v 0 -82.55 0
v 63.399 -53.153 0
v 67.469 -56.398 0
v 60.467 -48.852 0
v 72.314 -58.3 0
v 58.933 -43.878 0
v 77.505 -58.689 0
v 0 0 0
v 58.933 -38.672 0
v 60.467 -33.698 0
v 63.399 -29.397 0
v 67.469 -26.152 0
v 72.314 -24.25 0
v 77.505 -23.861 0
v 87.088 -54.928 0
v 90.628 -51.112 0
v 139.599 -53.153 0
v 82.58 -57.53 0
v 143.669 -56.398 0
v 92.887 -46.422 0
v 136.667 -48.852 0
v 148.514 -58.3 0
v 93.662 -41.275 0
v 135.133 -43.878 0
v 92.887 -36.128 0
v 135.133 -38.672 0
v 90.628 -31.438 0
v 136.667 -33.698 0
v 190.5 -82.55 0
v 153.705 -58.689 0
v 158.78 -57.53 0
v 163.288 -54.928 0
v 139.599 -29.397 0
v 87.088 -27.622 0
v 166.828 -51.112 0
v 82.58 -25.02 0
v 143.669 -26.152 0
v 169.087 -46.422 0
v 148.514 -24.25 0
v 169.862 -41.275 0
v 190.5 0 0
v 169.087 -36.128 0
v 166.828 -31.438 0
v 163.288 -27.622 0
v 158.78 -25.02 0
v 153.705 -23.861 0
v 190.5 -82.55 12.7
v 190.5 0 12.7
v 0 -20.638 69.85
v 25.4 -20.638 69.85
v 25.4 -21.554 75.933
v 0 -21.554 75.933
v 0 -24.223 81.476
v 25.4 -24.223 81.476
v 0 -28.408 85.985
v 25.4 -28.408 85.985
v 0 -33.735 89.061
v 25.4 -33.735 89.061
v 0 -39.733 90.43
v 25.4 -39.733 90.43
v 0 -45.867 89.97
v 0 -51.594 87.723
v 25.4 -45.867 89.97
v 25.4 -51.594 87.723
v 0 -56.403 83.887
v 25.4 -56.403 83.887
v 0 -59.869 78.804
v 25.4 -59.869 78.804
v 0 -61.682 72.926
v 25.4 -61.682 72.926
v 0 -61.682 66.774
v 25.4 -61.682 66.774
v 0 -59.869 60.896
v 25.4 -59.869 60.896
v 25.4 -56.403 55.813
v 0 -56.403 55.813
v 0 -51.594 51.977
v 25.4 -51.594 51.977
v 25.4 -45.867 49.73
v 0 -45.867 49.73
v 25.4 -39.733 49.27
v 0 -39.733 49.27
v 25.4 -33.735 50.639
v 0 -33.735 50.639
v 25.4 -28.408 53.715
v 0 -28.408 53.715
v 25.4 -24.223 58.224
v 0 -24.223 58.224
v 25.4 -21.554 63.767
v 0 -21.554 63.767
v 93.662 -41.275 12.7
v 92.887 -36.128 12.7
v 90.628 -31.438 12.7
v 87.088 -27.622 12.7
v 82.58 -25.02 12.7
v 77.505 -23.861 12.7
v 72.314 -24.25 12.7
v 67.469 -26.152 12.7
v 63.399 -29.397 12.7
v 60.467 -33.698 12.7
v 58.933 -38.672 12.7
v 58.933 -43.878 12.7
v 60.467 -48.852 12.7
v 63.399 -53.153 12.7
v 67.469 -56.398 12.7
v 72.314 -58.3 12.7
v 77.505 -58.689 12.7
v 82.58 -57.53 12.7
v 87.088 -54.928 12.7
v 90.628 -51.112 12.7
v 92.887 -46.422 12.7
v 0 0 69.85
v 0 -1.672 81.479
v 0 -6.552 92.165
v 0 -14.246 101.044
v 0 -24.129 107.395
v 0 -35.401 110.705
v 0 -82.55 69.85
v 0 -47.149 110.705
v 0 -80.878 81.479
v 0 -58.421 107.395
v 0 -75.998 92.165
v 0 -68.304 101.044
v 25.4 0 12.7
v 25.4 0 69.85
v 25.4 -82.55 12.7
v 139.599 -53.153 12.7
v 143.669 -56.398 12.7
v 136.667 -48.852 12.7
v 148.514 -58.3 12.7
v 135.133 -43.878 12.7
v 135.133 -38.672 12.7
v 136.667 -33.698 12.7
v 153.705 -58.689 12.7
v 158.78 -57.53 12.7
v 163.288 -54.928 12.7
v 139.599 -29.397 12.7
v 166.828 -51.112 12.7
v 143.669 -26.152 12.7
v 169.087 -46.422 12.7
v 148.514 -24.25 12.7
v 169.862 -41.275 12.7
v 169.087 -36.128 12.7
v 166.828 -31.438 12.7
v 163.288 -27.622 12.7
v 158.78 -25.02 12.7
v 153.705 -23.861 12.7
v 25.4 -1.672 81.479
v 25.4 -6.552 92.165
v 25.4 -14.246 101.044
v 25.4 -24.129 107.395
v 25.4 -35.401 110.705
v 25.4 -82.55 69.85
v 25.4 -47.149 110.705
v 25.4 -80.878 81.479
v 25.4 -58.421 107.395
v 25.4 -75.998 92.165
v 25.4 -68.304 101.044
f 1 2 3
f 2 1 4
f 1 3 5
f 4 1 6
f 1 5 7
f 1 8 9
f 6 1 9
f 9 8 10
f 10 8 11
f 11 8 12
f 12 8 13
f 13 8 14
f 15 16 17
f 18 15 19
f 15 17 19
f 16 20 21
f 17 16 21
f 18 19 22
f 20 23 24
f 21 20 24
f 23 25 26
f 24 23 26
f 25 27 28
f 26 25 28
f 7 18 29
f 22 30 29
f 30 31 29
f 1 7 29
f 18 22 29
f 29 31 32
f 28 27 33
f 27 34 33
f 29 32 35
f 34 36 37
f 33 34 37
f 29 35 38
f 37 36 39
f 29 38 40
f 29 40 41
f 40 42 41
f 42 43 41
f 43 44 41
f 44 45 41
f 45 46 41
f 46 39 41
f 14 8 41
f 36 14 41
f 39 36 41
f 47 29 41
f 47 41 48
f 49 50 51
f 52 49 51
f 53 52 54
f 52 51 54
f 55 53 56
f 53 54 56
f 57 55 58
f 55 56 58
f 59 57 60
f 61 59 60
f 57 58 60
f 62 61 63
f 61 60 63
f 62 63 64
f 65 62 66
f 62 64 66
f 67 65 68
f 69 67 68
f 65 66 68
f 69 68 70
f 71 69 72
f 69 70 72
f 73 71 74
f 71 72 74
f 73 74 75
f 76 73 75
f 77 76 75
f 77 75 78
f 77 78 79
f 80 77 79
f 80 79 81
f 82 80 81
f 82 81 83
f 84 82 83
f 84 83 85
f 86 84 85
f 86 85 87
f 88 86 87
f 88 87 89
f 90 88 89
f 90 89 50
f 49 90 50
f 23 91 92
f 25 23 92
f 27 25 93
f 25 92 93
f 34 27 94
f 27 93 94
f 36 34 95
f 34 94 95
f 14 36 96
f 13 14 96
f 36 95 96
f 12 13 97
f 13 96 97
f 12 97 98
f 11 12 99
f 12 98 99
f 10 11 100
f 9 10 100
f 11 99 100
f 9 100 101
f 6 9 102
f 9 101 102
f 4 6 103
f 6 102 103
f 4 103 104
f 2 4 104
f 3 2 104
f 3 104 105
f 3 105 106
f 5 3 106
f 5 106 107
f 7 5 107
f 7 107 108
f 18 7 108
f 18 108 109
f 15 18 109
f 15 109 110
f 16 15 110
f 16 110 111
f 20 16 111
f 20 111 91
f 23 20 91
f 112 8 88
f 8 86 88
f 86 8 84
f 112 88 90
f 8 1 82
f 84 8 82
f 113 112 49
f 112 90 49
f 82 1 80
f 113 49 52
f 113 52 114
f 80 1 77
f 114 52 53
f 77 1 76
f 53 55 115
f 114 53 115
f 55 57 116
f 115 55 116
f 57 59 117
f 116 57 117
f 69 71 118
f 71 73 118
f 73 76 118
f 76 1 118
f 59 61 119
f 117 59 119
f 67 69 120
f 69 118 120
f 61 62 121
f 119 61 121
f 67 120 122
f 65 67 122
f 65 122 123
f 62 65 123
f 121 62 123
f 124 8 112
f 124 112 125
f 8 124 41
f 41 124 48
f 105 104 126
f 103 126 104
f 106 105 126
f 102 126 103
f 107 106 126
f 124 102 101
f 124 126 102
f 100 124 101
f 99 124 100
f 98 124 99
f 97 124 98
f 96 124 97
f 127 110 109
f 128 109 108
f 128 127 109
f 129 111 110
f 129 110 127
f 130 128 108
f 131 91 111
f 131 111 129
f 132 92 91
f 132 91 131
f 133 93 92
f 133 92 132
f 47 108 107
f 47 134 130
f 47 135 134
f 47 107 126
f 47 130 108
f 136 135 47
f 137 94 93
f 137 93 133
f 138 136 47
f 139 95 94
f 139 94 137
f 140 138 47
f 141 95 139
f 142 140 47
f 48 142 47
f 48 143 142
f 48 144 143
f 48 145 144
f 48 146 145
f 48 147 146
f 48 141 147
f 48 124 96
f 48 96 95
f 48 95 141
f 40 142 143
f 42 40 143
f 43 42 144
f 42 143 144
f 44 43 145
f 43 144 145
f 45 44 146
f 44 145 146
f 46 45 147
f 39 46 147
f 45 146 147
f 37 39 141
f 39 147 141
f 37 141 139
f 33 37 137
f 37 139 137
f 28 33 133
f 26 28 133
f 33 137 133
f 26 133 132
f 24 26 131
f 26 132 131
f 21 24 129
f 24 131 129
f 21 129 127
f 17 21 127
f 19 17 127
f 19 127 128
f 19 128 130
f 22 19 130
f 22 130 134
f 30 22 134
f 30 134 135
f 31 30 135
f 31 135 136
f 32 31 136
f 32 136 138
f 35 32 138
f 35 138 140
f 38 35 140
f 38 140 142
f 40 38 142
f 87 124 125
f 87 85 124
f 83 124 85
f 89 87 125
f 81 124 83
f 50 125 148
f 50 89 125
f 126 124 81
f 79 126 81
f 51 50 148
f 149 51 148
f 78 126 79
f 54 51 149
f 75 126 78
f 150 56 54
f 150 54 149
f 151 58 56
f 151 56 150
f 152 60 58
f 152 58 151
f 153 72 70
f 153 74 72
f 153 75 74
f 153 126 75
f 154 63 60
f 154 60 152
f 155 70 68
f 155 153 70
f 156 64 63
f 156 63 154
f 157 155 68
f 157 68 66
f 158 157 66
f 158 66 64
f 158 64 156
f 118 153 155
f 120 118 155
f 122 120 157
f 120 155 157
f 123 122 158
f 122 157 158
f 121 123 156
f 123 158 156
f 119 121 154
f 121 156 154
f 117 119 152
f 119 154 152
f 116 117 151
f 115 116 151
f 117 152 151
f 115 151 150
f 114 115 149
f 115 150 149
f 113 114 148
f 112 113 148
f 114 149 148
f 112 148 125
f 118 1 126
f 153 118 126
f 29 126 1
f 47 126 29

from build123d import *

# Parameters (mm, degrees)
F0_W     = 190.5
F0_H     = 12.7
F1_DEPTH = 82.55
F2_R     = 17.4625
F3_DEPTH = 25.4
F4_W     = 25.4
F4_H     = 101.6
F5_DEPTH = 82.55
F7_DEPTH = 25.4
F8_R     = 20.6375
F9_DEPTH = 25.401


with BuildPart() as f1:
    # F0 (on Front) → F1 (new body)
    with BuildSketch(Plane.XZ):
        with Locations((95.25, 6.35)):
            Rectangle(F0_W, F0_H)
    extrude(amount=F1_DEPTH)

    # F2 (on face) → F3 (cut)
    with BuildSketch(Plane.XY.offset(12.7)):
        with Locations((76.2, -41.275)):
            Circle(F2_R)
        with Locations((152.4, -41.275)):
            Circle(F2_R)
    extrude(amount=-F3_DEPTH, mode=Mode.SUBTRACT)

    # F4 (on face) → F5 (join)
    with BuildSketch(Plane.XZ.offset(82.55)):
        with Locations((12.7, 63.5)):
            Rectangle(F4_W, F4_H)
    extrude(amount=-F5_DEPTH)

    # F6 (on face) → F7 (cut)
    with BuildSketch(Plane.YZ.offset(25.4)):
        with BuildLine():
            Line((-82.55, 114.3), (-82.55, 69.85))
            ThreePointArc((-82.55, 69.85), (-41.275, 111.125), (0, 69.85))
            Line((0, 69.85), (0, 114.3))
            Line((0, 114.3), (-82.55, 114.3))
        make_face()
    extrude(amount=-F7_DEPTH, mode=Mode.SUBTRACT)

    # F8 (on face) → F9 (cut, through all)
    with BuildSketch(Plane.YZ.offset(25.4)):
        with Locations((-41.275, 69.85)):
            Circle(F8_R)
    extrude(amount=-F9_DEPTH, mode=Mode.SUBTRACT)


solid = f1.part
